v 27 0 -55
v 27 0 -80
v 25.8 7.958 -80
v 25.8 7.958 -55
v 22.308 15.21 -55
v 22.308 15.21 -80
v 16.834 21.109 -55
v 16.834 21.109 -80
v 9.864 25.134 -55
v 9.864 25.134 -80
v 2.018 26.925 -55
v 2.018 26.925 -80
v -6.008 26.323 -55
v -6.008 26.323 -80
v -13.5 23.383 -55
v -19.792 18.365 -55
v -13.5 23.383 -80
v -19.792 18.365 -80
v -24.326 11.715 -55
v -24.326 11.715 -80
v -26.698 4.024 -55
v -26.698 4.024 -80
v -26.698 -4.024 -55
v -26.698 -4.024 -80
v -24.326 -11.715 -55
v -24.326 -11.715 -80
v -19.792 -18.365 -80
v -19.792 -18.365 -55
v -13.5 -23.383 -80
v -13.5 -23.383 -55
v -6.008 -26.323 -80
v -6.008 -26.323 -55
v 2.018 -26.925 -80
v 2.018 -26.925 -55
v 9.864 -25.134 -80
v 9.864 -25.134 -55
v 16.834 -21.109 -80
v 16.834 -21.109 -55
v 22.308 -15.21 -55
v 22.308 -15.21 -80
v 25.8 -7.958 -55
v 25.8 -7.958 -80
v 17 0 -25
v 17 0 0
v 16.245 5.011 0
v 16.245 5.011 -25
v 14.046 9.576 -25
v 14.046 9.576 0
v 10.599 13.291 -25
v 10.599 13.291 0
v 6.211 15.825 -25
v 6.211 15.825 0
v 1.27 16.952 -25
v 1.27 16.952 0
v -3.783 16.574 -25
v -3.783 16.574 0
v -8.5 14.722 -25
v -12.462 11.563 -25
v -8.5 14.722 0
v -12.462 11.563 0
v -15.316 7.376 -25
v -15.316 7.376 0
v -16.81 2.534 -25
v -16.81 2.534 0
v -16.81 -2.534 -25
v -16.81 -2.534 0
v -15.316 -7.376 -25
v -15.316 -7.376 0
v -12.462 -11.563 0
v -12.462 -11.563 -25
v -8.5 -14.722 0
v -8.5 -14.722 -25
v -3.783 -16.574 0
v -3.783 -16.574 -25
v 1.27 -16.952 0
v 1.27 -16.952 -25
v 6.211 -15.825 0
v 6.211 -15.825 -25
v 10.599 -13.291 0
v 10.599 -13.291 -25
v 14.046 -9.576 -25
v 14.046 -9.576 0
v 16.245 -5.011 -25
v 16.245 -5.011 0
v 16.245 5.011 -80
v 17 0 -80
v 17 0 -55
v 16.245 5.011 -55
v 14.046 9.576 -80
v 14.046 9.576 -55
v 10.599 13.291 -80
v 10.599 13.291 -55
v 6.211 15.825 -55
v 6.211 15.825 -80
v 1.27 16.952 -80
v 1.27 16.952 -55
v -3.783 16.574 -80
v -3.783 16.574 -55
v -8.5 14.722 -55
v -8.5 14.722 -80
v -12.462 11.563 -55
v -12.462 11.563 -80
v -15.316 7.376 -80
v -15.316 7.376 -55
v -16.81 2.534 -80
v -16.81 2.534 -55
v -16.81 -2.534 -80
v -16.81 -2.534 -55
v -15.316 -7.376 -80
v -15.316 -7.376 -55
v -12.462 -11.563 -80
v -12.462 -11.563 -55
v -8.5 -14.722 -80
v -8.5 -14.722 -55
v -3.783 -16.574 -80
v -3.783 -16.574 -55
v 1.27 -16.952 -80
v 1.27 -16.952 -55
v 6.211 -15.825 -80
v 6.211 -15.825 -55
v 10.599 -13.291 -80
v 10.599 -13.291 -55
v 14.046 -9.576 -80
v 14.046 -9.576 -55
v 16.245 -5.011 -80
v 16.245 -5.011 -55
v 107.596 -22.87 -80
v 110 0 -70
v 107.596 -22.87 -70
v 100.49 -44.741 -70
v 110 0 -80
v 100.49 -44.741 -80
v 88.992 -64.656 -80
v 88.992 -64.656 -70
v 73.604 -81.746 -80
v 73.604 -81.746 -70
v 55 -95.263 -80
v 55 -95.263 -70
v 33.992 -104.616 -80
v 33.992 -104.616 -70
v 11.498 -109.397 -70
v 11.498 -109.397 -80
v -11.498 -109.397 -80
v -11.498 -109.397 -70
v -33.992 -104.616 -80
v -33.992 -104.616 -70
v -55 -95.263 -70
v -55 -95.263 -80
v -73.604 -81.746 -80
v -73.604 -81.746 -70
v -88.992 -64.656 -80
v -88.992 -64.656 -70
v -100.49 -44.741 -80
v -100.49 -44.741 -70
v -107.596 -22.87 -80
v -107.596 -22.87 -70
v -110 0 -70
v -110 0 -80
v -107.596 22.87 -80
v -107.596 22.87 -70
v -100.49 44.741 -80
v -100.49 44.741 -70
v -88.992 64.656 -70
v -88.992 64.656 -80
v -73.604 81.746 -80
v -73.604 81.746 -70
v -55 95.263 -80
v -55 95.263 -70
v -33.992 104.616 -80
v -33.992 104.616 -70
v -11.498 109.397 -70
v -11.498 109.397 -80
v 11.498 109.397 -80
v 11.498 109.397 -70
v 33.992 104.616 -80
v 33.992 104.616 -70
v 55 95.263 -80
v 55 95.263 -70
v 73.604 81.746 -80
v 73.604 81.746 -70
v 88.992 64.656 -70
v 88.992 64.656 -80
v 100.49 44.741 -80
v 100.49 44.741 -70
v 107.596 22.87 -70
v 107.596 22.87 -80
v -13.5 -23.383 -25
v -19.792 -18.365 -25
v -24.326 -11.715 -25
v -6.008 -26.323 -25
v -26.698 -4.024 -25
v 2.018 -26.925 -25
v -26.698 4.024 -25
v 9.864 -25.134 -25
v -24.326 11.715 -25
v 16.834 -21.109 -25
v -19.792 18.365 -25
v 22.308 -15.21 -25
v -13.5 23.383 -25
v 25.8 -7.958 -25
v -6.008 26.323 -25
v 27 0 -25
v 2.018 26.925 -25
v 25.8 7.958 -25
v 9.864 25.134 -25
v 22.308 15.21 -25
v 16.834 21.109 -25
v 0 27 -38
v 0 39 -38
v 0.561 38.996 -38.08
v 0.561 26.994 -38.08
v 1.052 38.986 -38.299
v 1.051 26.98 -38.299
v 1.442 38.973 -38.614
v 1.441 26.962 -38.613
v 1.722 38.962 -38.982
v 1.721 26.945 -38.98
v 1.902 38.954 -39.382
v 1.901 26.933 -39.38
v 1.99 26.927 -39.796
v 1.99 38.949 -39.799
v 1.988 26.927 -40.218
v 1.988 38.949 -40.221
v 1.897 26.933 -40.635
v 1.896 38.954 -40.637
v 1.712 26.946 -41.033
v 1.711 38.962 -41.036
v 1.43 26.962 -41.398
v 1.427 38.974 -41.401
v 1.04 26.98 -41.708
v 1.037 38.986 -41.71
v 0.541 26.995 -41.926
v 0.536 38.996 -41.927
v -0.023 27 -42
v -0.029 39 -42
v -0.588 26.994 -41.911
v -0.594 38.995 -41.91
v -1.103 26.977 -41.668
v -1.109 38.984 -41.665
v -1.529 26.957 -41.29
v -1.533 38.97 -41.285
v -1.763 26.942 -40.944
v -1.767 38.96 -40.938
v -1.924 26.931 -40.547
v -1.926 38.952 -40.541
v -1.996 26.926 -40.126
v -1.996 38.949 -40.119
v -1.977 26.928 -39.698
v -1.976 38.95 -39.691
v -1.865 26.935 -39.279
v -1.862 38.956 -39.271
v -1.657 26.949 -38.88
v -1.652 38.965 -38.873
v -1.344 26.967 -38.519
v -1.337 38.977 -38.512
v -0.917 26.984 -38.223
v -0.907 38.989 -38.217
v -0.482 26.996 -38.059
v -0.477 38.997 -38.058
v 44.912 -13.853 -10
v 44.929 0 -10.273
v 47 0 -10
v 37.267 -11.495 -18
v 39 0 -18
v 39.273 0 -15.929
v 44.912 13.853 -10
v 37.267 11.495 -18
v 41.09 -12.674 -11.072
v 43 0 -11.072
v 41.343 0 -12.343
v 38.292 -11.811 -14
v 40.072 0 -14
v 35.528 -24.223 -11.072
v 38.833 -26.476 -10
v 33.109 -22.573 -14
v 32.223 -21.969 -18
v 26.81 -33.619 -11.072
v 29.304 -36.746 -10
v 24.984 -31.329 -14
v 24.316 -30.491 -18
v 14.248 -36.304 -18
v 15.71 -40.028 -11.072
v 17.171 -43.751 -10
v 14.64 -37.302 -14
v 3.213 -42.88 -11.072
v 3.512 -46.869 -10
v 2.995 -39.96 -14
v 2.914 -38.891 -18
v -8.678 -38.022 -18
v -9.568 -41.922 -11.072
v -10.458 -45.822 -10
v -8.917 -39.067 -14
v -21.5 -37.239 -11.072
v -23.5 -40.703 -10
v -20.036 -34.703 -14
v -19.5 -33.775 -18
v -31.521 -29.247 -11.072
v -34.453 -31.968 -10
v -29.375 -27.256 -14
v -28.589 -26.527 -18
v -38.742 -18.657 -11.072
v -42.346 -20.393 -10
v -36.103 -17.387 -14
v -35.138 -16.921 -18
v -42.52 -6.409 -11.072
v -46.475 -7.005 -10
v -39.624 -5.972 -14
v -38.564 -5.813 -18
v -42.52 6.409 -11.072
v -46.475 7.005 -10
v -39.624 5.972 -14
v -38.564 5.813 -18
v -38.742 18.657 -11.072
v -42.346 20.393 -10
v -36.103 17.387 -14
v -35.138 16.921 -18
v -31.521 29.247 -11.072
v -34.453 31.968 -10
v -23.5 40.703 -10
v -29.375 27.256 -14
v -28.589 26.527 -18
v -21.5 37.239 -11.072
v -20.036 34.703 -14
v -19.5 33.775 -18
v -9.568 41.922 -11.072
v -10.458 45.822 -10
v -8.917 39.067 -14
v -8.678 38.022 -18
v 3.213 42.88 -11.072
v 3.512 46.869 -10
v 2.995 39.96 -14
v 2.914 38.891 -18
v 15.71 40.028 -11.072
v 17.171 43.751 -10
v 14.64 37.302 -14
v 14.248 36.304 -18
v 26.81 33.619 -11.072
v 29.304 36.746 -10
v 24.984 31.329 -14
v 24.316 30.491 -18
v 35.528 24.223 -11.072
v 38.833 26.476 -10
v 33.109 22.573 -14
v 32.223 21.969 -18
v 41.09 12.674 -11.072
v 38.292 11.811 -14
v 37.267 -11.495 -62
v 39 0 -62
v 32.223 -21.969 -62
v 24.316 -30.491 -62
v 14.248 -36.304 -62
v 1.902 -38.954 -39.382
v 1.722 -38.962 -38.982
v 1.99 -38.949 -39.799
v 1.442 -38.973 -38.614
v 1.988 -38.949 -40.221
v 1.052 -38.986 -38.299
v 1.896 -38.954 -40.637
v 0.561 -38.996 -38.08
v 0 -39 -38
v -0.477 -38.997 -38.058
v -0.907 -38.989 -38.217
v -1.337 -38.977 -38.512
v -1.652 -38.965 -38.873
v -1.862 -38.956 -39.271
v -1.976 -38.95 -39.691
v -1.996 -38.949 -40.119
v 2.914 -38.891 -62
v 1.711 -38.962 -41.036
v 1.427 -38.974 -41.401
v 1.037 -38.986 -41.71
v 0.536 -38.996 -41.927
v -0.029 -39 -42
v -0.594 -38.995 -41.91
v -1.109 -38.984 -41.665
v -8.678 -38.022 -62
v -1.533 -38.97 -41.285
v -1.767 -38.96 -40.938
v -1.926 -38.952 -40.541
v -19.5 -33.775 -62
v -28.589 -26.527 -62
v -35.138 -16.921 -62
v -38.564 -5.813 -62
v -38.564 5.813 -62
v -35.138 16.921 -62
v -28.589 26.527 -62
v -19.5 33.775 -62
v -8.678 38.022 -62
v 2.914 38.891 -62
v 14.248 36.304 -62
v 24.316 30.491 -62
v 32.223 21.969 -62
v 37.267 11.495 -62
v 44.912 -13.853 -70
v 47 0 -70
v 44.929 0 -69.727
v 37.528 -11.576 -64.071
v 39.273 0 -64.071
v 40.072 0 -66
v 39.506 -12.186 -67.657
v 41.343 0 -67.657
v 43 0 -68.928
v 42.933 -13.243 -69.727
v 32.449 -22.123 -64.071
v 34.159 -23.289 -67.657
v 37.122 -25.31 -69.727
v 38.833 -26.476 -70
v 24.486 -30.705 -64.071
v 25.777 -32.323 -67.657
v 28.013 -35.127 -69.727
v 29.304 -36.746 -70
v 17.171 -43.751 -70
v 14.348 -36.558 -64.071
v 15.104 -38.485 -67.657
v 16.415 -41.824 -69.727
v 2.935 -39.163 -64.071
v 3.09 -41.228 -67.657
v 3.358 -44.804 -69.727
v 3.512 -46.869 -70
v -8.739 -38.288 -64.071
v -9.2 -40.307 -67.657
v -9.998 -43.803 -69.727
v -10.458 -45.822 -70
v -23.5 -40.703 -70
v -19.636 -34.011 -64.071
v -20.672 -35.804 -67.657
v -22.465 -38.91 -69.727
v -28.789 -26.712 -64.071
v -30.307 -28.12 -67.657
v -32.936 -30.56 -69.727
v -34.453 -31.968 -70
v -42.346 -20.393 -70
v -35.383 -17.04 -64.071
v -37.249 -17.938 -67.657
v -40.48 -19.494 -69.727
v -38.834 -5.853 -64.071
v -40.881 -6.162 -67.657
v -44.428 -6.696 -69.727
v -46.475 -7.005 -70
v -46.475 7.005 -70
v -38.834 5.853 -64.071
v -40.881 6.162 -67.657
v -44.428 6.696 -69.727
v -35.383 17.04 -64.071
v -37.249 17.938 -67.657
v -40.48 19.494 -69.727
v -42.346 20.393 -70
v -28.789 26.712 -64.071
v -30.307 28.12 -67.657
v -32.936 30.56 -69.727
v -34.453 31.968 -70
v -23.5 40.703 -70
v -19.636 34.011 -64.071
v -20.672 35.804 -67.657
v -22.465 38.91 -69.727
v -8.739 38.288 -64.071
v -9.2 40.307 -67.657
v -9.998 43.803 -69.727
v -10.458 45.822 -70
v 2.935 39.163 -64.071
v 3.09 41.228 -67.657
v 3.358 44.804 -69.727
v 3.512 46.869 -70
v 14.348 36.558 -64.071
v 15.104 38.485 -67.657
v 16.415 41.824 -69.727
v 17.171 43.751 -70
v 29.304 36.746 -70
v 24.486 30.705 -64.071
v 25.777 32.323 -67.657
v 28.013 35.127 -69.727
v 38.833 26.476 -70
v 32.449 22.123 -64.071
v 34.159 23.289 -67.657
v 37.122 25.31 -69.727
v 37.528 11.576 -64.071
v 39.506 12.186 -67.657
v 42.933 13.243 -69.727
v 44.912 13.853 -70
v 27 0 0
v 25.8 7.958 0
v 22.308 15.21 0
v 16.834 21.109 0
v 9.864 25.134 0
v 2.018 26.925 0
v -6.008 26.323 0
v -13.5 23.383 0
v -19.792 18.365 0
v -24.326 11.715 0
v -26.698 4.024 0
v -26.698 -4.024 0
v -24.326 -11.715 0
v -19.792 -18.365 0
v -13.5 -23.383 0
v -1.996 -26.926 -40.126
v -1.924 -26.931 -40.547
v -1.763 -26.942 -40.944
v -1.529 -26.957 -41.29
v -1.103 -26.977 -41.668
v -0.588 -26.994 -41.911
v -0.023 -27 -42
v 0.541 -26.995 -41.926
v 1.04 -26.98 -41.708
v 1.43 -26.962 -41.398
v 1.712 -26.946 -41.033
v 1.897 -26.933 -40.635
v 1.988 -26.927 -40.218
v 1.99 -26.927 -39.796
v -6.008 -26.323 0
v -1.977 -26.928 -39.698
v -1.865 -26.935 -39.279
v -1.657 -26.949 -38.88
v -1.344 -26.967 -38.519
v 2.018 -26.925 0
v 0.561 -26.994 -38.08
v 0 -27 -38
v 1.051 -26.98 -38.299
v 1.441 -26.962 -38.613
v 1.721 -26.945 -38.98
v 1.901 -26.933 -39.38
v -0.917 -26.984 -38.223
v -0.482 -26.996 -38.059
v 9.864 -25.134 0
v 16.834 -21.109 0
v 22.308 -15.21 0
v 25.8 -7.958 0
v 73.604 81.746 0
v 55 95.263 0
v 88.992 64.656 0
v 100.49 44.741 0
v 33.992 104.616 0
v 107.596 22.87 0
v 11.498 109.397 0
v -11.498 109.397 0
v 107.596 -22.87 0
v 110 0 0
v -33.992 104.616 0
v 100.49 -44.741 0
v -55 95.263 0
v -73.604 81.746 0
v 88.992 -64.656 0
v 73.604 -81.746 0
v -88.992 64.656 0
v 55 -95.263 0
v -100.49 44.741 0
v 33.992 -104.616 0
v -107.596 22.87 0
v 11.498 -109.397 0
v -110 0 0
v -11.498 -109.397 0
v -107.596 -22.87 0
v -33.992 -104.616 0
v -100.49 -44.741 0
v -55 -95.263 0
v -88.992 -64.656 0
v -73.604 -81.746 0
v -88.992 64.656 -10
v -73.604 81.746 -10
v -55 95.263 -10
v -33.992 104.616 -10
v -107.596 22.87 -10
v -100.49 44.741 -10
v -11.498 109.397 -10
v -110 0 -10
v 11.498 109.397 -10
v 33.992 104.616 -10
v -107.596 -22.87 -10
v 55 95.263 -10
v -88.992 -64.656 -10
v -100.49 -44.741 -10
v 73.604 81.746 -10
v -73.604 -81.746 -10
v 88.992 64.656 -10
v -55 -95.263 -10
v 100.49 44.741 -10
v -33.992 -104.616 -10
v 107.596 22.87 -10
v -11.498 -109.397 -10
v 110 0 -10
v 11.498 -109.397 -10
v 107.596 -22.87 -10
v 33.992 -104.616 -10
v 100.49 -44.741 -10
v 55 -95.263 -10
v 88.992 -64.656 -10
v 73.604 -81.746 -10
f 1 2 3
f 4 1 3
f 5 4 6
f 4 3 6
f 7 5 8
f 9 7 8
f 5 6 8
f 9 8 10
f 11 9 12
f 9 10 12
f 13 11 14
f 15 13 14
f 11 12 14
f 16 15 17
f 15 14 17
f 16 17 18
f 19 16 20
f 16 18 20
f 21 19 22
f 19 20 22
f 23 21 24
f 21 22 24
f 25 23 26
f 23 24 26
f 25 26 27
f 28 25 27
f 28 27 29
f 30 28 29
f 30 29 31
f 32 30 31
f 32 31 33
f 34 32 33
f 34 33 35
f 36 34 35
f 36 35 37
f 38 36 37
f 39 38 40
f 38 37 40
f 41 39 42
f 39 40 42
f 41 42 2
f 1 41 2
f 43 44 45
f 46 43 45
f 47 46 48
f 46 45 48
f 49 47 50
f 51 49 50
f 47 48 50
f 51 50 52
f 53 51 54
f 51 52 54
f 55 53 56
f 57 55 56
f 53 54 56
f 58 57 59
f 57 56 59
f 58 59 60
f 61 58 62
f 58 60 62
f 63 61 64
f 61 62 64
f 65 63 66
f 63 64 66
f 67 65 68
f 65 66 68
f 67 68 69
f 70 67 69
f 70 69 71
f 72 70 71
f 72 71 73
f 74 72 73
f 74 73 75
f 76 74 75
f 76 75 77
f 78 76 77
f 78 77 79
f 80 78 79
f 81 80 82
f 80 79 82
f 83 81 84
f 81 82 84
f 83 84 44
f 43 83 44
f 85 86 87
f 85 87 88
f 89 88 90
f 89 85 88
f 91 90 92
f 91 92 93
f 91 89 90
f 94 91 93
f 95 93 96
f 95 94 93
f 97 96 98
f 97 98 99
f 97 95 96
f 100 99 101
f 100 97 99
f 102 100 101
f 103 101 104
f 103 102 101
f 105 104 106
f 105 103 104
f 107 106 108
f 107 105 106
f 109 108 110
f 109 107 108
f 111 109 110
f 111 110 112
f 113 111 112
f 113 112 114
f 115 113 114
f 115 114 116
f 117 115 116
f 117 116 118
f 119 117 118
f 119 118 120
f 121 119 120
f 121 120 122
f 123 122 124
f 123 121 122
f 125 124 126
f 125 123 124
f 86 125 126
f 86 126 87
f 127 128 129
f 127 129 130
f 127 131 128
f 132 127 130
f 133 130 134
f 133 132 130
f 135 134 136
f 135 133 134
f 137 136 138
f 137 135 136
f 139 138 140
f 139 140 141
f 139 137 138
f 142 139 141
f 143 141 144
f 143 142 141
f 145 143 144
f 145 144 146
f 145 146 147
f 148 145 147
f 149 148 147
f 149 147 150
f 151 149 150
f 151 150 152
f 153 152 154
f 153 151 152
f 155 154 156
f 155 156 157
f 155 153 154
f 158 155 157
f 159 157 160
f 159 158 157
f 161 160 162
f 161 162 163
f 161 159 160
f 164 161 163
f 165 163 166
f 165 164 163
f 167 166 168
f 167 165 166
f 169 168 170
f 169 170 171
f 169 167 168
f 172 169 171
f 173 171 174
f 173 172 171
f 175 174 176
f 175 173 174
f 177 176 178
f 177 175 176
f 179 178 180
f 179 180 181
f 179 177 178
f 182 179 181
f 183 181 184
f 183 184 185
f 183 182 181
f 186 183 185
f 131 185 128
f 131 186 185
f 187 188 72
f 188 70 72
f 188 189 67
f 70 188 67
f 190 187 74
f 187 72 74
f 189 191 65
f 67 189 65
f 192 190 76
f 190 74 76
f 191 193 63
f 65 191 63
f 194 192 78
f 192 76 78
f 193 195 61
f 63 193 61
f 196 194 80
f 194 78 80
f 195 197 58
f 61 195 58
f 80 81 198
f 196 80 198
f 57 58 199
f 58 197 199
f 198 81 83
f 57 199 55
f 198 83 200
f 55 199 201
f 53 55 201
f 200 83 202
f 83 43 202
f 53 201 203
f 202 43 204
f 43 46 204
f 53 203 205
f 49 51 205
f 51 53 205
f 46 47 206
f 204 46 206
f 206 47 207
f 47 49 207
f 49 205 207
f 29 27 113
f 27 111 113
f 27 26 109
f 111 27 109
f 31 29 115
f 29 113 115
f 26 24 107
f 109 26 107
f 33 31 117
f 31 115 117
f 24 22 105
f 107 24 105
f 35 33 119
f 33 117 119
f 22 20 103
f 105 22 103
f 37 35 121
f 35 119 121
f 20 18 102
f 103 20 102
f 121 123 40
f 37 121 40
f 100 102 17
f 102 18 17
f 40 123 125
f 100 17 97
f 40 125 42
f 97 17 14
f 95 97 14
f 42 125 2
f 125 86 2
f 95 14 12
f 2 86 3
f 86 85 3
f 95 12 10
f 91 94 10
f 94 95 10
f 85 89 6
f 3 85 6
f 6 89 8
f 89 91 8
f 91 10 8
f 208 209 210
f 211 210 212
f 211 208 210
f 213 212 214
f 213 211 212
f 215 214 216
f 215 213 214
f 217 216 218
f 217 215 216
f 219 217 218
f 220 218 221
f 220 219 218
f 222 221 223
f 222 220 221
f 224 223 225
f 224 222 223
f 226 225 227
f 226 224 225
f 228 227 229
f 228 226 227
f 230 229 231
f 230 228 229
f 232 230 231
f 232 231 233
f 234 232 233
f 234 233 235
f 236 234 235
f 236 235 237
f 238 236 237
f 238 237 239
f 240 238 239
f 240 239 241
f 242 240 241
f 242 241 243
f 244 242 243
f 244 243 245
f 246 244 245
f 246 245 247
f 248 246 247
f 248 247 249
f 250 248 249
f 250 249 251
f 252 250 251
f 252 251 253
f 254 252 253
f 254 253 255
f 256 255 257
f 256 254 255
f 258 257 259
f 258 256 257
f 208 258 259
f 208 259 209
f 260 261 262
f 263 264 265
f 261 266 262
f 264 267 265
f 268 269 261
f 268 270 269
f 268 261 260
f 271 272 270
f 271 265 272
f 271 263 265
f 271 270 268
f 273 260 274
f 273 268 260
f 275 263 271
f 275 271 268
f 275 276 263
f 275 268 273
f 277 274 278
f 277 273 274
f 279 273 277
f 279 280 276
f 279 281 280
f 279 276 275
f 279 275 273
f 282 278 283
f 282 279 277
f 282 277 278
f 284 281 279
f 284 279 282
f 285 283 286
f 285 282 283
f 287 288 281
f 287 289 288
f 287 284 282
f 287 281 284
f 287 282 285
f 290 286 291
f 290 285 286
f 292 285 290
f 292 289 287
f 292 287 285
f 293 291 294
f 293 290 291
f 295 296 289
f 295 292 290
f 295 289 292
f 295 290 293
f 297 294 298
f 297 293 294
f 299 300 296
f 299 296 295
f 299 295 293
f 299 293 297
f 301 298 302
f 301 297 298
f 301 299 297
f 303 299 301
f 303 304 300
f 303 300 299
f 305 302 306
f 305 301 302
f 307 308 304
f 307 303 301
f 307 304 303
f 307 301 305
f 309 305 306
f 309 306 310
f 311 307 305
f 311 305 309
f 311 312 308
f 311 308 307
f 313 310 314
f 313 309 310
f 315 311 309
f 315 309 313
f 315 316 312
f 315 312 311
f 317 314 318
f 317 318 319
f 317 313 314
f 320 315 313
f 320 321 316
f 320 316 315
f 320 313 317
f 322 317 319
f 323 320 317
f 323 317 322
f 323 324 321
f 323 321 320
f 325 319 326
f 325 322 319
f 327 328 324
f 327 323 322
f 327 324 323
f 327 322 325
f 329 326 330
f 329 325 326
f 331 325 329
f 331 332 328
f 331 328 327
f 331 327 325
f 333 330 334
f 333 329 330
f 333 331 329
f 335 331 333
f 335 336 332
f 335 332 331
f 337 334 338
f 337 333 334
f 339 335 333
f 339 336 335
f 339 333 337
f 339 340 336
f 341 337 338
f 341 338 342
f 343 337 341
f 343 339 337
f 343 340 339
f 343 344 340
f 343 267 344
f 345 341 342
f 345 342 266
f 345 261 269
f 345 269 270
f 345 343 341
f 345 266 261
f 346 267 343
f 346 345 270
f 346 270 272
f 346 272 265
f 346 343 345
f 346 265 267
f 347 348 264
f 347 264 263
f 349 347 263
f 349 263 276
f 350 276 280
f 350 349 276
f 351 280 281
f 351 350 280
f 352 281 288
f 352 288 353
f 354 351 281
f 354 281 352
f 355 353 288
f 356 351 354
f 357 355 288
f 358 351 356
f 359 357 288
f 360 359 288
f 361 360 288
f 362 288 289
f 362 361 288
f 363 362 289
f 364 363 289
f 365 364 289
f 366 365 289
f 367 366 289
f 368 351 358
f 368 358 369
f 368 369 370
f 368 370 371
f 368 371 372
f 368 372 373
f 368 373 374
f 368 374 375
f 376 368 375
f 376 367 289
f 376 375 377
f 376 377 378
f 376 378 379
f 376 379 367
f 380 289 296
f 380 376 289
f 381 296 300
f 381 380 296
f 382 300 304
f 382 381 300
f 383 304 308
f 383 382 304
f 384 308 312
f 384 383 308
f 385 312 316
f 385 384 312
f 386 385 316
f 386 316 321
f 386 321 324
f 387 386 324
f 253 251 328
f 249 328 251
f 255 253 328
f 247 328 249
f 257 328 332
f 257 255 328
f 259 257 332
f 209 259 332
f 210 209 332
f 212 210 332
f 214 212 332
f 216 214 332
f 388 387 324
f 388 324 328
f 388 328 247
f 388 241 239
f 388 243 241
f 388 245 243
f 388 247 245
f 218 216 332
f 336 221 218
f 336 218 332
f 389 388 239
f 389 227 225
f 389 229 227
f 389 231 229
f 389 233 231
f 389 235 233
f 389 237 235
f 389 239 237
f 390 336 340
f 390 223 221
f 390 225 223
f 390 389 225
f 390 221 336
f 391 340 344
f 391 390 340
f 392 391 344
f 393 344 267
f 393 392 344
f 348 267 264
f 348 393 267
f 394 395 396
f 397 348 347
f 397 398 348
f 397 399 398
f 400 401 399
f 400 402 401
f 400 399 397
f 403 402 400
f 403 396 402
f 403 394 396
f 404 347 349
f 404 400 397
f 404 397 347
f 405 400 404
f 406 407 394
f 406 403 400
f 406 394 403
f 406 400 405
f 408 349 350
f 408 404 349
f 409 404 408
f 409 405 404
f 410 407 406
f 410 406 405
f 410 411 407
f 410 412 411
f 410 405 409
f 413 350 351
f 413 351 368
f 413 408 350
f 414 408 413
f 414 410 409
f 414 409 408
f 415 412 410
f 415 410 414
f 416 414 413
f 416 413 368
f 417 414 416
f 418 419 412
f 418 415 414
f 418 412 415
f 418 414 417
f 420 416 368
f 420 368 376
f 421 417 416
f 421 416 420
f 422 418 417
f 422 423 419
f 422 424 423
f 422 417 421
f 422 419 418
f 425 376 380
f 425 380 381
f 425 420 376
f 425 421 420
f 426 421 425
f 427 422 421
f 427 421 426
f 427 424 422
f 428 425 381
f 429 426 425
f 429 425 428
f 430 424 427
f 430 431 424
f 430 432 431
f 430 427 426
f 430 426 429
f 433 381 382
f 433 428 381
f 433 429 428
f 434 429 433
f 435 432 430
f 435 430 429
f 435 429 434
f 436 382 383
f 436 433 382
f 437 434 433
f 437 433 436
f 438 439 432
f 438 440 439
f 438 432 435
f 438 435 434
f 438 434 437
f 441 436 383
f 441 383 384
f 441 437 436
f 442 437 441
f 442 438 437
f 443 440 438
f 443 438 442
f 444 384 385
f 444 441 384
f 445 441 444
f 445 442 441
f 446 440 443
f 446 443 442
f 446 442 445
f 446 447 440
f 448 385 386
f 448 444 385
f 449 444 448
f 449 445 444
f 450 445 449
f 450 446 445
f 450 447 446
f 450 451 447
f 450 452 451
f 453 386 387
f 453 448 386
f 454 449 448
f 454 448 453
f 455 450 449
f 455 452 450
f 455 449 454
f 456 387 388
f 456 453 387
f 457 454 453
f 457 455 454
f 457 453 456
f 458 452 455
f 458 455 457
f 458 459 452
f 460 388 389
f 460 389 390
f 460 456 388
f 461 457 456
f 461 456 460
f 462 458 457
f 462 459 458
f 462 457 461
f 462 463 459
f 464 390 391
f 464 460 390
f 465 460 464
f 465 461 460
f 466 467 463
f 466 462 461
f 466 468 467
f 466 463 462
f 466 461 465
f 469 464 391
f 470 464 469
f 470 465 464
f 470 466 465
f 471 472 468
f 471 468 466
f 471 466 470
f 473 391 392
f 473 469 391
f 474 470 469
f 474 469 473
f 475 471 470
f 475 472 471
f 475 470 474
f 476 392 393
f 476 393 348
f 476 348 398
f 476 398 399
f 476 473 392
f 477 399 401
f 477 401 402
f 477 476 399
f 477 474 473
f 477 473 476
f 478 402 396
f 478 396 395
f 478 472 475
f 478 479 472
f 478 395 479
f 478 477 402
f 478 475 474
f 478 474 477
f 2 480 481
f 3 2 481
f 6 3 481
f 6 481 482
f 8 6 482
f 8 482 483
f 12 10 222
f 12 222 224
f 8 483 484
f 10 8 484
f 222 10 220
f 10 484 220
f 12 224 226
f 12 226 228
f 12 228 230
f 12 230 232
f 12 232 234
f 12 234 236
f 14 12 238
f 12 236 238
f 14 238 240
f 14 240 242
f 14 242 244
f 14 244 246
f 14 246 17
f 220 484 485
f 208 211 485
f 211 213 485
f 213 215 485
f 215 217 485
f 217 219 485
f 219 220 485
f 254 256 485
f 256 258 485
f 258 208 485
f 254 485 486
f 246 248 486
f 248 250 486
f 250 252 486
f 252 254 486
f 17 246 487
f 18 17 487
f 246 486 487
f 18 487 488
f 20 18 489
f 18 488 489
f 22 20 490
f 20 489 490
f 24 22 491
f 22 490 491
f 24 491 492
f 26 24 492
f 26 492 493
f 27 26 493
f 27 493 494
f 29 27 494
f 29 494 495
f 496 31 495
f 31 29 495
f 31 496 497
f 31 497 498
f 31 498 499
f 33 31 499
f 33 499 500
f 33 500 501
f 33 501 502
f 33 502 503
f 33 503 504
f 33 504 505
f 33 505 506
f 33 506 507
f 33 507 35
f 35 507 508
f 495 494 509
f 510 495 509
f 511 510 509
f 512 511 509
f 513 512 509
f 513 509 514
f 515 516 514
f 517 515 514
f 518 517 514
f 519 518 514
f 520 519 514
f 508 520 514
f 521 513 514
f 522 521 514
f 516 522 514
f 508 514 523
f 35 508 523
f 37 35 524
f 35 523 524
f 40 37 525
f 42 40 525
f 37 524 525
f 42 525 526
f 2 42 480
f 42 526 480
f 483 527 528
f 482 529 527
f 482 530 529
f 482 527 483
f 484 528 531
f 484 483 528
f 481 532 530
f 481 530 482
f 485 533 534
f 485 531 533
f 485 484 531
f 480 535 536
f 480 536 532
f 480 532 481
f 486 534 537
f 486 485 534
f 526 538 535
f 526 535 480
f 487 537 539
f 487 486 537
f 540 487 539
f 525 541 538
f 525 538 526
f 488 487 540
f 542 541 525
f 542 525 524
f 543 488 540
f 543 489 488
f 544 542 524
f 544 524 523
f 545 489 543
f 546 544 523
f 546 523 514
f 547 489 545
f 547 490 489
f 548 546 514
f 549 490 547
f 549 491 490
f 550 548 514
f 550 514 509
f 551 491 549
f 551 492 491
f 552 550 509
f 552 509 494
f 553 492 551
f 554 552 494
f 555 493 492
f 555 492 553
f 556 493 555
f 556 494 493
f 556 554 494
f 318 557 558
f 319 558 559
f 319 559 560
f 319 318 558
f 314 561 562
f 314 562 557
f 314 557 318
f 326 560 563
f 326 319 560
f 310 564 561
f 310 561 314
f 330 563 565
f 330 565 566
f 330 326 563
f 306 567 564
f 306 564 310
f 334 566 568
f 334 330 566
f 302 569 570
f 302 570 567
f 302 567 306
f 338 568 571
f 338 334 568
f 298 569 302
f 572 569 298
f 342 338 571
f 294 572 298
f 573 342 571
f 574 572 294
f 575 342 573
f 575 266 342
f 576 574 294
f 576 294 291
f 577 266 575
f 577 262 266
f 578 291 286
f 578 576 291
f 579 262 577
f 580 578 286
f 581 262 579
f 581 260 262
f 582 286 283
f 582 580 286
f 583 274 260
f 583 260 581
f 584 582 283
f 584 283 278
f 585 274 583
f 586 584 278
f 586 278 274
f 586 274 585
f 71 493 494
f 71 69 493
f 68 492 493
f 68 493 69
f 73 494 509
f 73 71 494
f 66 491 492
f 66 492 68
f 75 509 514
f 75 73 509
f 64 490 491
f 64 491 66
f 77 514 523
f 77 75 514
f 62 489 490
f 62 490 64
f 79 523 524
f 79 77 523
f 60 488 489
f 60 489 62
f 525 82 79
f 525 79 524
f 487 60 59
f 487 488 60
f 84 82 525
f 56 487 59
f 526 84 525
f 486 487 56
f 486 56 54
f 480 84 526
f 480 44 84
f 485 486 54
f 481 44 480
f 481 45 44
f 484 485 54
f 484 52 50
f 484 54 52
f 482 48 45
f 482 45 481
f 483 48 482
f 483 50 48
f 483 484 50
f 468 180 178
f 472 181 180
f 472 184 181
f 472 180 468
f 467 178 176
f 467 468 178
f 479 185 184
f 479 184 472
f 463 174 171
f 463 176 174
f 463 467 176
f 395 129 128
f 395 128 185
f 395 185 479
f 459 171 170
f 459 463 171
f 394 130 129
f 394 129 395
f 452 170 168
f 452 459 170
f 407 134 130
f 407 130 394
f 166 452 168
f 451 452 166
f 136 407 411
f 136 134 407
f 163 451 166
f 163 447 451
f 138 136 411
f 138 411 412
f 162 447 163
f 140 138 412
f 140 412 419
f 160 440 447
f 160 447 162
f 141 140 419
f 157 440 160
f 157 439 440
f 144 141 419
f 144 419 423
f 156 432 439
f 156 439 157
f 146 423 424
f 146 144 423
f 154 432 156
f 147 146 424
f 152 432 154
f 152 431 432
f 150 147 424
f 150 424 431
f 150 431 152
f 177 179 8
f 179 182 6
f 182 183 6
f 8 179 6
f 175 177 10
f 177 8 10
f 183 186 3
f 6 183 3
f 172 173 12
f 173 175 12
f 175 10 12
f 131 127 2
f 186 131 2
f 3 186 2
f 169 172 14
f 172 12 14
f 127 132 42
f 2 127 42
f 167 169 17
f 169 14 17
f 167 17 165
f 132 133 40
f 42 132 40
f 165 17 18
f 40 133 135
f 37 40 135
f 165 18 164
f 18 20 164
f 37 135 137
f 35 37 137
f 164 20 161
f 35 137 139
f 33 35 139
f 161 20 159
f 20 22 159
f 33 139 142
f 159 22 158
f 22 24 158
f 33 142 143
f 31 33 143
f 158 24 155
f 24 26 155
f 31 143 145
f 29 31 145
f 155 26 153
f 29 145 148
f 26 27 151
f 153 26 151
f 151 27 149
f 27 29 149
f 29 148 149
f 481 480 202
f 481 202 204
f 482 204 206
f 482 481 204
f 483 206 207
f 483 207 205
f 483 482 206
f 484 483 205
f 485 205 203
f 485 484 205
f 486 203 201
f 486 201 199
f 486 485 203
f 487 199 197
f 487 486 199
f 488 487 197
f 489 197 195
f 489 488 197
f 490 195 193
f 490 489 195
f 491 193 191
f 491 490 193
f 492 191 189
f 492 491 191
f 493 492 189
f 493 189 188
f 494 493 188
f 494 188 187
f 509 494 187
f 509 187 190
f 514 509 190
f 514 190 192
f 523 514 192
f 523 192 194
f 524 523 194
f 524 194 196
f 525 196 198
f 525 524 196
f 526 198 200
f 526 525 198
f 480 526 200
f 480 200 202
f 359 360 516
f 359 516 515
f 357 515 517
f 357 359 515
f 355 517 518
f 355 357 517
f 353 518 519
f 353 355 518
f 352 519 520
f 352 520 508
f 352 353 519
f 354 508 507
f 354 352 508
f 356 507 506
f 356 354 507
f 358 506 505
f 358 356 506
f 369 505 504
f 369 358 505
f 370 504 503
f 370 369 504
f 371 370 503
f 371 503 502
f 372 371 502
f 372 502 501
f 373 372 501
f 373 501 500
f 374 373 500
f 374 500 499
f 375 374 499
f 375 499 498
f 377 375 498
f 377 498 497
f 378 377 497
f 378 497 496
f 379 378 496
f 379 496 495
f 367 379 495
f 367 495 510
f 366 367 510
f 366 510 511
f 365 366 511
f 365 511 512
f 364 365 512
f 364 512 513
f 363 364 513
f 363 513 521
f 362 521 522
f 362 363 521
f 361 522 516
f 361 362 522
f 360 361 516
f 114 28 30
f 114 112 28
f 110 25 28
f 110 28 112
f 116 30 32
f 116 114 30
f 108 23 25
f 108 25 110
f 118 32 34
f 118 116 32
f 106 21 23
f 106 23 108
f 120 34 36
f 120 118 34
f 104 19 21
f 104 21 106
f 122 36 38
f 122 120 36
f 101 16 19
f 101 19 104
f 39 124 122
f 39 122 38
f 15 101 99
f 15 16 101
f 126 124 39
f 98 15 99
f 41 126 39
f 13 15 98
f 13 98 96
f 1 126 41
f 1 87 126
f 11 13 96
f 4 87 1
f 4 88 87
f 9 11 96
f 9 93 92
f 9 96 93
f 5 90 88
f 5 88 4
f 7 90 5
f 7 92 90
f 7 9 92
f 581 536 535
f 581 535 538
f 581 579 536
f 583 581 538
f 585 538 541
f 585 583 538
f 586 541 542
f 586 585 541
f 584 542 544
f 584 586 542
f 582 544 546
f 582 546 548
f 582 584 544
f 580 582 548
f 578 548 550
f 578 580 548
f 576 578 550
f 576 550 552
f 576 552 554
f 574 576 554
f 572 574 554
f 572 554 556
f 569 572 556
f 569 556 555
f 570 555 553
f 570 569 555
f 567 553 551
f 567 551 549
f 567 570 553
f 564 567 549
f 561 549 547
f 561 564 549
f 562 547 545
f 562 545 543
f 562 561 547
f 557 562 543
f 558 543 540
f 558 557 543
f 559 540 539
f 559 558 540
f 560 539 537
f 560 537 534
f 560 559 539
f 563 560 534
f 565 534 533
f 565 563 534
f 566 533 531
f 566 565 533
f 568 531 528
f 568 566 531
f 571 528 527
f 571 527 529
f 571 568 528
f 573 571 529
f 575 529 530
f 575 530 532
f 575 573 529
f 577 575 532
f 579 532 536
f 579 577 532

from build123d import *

# Parameters (mm, degrees)
SKETCH2_W               = 80
SKETCH2_H               = 110
SKETCH6_R               = 27
CUT_EXTRUDE2_DEPTH      = 175.928556845
CUT_EXTRUDE3_DEPTH      = 175.928556845
CUT_EXTRUDE3_DEPTH_BACK = 175.928556845
SKETCH7_R               = 2
SKETCH8_R               = 27
SKETCH8_R_2             = 17
BOSS_EXTRUDE1_DEPTH     = 25


with BuildPart() as part:
    # Sketch2 → Revolve1 (revolve)
    with BuildSketch(Plane(origin=(0, 0, 0), x_dir=(0, 0, -1), z_dir=(1, 0, 0)), mode=Mode.PRIVATE) as revolve1_sk:
        with Locations((40, 55)):
            Rectangle(SKETCH2_W, SKETCH2_H)
    revolve(revolve1_sk.sketch.rotate(Axis((0, 0, 0), (0, 0, -1)), 90), axis=Axis((0, 0, 0), (0, 0, -1)))

    # Sketch6 → Cut-Extrude2 (cut, through all)
    with BuildSketch(Plane.XY):
        Circle(SKETCH6_R)
    extrude(amount=-CUT_EXTRUDE2_DEPTH, mode=Mode.SUBTRACT)

    # Sketch7 → Cut-Extrude3 (cut, two sides: drawn at the far end of the back side and taken through both)
    with BuildSketch(Plane(origin=(0, 0, 0), x_dir=(1, 0, 0), z_dir=(0, 1, 0)).offset(-CUT_EXTRUDE3_DEPTH_BACK)):
        with Locations(Location((0, 40, 0), (0, 0, 270))):
            Circle(SKETCH7_R)
    extrude(amount=CUT_EXTRUDE3_DEPTH + CUT_EXTRUDE3_DEPTH_BACK, mode=Mode.SUBTRACT)

    # Sketch3 → Cut-Revolve1 (revolve, cut)
    with BuildSketch(Plane(origin=(0, 0, 0), x_dir=(0, 0, -1), z_dir=(1, 0, 0)), mode=Mode.PRIVATE) as cut_revolve1_sk:
        with BuildLine():
            Line((10, 110), (10, 47))
            ThreePointArc((10, 47), (12.343145751, 41.343145751), (18, 39))
            Line((18, 39), (62, 39))
            ThreePointArc((62, 39), (67.656854249, 41.343145751), (70, 47))
            Line((70, 47), (70, 110))
            Line((70, 110), (10, 110))
        make_face()
    revolve(cut_revolve1_sk.sketch.rotate(Axis((0, 0, 1000), (0, 0, -1)), 90), axis=Axis((0, 0, 1000), (0, 0, -1)), mode=Mode.SUBTRACT)


with BuildPart() as body_2:
    # Sketch8 → Boss-Extrude1 (new body)
    with BuildSketch(Plane.XY):
        Circle(SKETCH8_R)
        Circle(SKETCH8_R_2, mode=Mode.SUBTRACT)
    extrude(amount=-BOSS_EXTRUDE1_DEPTH)


with BuildPart() as body_3:
    # Mirror2: mirrored copy
    add(body_2.part.mirror(Plane.XY.offset(-40)))


solid = Compound([part.part, body_2.part, body_3.part])
